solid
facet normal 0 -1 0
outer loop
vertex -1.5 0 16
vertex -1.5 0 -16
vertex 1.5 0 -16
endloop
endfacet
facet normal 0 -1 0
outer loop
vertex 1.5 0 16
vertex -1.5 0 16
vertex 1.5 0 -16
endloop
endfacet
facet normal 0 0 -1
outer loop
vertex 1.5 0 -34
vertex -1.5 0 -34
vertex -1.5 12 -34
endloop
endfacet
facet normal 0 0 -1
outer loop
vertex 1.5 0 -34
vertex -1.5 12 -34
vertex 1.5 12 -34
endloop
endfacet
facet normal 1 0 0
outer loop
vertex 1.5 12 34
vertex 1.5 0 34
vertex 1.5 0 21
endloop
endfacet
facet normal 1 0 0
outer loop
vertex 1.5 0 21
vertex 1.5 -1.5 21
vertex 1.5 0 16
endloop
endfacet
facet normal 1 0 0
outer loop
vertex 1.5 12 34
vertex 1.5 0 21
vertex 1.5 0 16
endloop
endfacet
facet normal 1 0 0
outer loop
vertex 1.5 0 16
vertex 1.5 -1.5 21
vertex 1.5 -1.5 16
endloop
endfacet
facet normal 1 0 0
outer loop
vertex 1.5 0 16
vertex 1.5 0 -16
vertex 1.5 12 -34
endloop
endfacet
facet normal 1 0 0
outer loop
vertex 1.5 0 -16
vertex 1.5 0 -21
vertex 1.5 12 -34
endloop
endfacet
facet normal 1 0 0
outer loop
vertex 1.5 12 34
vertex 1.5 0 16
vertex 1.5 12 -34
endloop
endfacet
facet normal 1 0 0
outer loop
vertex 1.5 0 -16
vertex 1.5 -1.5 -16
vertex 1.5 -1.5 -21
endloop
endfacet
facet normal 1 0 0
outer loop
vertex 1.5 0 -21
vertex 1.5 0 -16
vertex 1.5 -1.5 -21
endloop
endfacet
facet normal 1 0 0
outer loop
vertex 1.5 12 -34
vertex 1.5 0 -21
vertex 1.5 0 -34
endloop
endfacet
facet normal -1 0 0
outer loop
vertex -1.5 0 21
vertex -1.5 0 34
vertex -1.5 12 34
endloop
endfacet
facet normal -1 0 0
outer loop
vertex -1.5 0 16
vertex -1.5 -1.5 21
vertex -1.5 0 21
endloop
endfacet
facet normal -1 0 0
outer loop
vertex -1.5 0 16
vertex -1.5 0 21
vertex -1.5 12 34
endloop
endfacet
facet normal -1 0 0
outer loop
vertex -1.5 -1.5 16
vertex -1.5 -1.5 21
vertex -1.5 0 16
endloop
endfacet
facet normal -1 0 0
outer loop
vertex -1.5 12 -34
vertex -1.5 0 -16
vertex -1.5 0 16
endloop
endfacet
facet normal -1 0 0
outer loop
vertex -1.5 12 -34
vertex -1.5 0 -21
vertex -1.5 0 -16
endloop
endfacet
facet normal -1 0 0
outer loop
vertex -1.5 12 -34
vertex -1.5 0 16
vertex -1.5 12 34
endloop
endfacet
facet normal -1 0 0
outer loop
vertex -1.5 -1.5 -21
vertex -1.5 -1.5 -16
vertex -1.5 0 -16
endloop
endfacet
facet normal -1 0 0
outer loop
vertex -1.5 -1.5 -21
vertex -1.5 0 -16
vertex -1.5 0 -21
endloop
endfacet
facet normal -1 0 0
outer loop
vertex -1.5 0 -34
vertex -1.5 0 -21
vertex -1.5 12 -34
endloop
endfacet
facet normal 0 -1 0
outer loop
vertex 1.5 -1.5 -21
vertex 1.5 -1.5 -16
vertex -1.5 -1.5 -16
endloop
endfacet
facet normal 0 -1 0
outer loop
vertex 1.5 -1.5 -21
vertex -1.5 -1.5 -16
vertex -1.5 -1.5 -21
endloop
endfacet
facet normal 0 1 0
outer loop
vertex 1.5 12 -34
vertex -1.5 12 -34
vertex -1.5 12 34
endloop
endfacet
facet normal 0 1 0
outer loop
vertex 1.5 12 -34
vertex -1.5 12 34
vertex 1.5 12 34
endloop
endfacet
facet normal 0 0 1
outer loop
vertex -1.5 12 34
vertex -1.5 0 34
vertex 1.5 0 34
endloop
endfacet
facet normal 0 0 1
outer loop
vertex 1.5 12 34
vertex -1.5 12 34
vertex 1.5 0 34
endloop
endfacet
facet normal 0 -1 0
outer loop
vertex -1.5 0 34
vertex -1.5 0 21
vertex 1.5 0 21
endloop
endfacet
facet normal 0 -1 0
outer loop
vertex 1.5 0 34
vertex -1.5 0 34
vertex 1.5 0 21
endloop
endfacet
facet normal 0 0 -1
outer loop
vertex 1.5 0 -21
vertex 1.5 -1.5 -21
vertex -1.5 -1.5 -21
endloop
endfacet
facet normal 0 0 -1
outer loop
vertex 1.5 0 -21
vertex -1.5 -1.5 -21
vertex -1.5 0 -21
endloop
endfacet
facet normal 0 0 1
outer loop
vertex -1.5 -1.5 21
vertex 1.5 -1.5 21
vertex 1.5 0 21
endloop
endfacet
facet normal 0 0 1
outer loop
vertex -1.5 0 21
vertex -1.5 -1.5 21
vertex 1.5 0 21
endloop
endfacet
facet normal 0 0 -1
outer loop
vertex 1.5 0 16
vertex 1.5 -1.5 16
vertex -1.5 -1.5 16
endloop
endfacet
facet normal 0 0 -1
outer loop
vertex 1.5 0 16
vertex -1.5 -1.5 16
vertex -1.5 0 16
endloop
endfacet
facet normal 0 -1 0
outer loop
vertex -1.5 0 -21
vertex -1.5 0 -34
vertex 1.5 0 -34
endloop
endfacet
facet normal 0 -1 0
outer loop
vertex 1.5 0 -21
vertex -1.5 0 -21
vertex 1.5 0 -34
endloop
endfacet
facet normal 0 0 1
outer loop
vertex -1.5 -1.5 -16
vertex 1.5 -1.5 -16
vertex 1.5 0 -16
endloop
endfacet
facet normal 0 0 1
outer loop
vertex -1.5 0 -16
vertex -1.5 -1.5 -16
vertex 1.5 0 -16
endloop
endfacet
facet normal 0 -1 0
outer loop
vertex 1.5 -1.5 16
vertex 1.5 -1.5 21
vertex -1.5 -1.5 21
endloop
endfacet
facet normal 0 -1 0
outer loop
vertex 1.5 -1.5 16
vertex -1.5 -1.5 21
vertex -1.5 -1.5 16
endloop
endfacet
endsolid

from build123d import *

# Parameters (mm, degrees)
ESBO_O1_W                = 3
ESBO_O1_H                = 68
RESSALTO_EXTRUS_O1_DEPTH = 12
ESBO_O2_W                = 5
ESBO_O2_H                = 1.5
RESSALTO_EXTRUS_O2_DEPTH = 3


with BuildPart() as part:
    # Esboço1 → Ressalto-extrusão1 (new body)
    with BuildSketch(Plane(origin=(0, 0, 0), x_dir=(1, 0, 0), z_dir=(0, 1, 0))):
        Rectangle(ESBO_O1_W, ESBO_O1_H)
    extrude(amount=RESSALTO_EXTRUS_O1_DEPTH)

    # Esboço2 → Ressalto-extrusão2 (add)
    with BuildSketch(Plane(origin=(1.5, 0, 0), x_dir=(0, 0, -1), z_dir=(1, 0, 0))):
        with Locations((-18.5, -0.75)):
            Rectangle(ESBO_O2_W, ESBO_O2_H)
        with Locations((18.5, -0.75)):
            Rectangle(ESBO_O2_W, ESBO_O2_H)
    extrude(amount=-RESSALTO_EXTRUS_O2_DEPTH)


solid = part.part
